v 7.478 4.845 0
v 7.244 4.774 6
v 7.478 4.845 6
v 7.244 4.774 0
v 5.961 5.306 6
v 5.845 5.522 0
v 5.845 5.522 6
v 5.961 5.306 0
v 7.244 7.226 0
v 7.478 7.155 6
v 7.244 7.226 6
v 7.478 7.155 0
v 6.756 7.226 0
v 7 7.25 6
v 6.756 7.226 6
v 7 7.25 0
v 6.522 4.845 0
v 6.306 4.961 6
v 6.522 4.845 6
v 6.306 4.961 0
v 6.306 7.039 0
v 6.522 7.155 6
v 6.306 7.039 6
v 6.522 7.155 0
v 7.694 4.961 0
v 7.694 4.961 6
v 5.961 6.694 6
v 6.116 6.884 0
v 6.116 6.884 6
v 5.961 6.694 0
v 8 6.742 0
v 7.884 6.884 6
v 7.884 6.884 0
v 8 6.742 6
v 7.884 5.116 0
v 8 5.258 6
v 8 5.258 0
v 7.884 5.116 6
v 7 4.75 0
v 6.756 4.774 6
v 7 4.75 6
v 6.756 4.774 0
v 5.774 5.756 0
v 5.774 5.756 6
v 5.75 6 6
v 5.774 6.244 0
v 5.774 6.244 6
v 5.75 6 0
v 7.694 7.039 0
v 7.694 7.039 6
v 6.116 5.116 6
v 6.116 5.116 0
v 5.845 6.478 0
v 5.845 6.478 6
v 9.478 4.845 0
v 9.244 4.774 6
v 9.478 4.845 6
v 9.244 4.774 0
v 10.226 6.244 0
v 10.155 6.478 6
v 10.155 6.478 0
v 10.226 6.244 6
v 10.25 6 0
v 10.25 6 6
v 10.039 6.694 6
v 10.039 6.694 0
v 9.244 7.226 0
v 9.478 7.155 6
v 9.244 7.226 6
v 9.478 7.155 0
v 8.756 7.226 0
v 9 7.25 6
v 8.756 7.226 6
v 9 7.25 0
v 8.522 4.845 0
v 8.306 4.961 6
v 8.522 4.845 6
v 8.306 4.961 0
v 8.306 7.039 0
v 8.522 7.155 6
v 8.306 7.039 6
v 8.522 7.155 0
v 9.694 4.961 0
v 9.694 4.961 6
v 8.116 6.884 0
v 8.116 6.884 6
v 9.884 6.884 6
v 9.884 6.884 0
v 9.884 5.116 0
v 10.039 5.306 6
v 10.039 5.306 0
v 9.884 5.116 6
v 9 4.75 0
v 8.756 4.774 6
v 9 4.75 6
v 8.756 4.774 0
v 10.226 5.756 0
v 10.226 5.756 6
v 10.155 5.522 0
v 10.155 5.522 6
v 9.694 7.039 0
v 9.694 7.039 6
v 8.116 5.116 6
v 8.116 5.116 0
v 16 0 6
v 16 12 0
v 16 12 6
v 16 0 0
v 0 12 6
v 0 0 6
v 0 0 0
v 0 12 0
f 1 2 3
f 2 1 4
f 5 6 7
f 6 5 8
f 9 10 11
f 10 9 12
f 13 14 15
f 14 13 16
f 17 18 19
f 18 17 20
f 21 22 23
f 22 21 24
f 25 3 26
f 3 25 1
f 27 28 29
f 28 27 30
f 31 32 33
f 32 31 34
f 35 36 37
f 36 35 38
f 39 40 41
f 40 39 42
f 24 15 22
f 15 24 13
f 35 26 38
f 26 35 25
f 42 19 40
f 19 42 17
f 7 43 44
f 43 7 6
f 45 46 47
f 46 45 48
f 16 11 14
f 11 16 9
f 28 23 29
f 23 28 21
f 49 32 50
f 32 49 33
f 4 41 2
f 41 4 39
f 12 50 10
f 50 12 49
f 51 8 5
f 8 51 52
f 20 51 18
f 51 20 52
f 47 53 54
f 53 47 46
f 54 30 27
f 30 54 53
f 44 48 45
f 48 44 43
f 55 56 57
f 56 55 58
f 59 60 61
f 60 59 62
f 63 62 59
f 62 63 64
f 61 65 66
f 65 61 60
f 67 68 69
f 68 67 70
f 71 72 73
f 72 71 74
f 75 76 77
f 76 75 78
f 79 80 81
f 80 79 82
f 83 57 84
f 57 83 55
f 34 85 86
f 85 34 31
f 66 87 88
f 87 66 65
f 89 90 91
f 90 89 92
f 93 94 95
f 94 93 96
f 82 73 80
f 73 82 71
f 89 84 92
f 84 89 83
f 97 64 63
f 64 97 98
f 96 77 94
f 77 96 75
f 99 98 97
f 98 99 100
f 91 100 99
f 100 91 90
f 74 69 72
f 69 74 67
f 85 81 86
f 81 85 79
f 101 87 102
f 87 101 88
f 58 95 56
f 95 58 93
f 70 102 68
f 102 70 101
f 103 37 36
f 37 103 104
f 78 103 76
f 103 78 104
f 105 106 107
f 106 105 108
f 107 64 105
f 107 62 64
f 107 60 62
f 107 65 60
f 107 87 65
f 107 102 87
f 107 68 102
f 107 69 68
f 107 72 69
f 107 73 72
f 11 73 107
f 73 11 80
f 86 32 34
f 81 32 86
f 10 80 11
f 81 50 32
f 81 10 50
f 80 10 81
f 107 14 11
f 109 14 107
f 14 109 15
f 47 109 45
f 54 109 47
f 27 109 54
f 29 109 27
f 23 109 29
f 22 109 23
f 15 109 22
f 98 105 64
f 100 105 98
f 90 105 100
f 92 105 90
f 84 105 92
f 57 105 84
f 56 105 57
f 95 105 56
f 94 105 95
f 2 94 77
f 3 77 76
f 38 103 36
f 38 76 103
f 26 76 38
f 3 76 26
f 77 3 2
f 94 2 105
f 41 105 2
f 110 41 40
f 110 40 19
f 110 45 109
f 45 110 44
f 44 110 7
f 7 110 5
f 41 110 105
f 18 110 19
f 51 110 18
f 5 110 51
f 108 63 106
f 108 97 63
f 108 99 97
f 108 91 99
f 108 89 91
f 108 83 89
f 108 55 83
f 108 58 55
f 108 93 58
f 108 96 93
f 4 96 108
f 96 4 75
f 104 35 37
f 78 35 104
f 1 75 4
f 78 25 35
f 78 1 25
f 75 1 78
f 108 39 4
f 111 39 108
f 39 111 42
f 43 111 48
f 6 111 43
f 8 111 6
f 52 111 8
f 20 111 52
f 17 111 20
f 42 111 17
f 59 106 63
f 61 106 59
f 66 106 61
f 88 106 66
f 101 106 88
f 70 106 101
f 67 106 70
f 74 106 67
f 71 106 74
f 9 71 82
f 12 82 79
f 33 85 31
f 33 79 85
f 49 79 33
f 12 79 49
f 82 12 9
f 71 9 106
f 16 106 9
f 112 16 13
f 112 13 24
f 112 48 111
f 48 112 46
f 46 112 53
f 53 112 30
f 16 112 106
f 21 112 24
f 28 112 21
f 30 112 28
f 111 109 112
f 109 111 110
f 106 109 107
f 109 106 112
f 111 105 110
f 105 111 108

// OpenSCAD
$fn = 32;

// ----------------------------------------------------------------------
// Micro pad: two-hole pad, 5-20 mm class
// ----------------------------------------------------------------------

// --- parameters (mm) ---
pad_l = 16;               // pad length, X
pad_w = 12;               // pad width, Y
pad_t = 6;                // pad thickness, Z
hole_d = 2.5;             // hole diameter
hole_x = 7;               // X of the first hole centre

difference() {
  cube([pad_l, pad_w, pad_t]);
  for (x = [hole_x, pad_l - hole_x])
    translate([x, pad_w / 2, -1])
      cylinder(h = pad_t + 2, d = hole_d);
}
